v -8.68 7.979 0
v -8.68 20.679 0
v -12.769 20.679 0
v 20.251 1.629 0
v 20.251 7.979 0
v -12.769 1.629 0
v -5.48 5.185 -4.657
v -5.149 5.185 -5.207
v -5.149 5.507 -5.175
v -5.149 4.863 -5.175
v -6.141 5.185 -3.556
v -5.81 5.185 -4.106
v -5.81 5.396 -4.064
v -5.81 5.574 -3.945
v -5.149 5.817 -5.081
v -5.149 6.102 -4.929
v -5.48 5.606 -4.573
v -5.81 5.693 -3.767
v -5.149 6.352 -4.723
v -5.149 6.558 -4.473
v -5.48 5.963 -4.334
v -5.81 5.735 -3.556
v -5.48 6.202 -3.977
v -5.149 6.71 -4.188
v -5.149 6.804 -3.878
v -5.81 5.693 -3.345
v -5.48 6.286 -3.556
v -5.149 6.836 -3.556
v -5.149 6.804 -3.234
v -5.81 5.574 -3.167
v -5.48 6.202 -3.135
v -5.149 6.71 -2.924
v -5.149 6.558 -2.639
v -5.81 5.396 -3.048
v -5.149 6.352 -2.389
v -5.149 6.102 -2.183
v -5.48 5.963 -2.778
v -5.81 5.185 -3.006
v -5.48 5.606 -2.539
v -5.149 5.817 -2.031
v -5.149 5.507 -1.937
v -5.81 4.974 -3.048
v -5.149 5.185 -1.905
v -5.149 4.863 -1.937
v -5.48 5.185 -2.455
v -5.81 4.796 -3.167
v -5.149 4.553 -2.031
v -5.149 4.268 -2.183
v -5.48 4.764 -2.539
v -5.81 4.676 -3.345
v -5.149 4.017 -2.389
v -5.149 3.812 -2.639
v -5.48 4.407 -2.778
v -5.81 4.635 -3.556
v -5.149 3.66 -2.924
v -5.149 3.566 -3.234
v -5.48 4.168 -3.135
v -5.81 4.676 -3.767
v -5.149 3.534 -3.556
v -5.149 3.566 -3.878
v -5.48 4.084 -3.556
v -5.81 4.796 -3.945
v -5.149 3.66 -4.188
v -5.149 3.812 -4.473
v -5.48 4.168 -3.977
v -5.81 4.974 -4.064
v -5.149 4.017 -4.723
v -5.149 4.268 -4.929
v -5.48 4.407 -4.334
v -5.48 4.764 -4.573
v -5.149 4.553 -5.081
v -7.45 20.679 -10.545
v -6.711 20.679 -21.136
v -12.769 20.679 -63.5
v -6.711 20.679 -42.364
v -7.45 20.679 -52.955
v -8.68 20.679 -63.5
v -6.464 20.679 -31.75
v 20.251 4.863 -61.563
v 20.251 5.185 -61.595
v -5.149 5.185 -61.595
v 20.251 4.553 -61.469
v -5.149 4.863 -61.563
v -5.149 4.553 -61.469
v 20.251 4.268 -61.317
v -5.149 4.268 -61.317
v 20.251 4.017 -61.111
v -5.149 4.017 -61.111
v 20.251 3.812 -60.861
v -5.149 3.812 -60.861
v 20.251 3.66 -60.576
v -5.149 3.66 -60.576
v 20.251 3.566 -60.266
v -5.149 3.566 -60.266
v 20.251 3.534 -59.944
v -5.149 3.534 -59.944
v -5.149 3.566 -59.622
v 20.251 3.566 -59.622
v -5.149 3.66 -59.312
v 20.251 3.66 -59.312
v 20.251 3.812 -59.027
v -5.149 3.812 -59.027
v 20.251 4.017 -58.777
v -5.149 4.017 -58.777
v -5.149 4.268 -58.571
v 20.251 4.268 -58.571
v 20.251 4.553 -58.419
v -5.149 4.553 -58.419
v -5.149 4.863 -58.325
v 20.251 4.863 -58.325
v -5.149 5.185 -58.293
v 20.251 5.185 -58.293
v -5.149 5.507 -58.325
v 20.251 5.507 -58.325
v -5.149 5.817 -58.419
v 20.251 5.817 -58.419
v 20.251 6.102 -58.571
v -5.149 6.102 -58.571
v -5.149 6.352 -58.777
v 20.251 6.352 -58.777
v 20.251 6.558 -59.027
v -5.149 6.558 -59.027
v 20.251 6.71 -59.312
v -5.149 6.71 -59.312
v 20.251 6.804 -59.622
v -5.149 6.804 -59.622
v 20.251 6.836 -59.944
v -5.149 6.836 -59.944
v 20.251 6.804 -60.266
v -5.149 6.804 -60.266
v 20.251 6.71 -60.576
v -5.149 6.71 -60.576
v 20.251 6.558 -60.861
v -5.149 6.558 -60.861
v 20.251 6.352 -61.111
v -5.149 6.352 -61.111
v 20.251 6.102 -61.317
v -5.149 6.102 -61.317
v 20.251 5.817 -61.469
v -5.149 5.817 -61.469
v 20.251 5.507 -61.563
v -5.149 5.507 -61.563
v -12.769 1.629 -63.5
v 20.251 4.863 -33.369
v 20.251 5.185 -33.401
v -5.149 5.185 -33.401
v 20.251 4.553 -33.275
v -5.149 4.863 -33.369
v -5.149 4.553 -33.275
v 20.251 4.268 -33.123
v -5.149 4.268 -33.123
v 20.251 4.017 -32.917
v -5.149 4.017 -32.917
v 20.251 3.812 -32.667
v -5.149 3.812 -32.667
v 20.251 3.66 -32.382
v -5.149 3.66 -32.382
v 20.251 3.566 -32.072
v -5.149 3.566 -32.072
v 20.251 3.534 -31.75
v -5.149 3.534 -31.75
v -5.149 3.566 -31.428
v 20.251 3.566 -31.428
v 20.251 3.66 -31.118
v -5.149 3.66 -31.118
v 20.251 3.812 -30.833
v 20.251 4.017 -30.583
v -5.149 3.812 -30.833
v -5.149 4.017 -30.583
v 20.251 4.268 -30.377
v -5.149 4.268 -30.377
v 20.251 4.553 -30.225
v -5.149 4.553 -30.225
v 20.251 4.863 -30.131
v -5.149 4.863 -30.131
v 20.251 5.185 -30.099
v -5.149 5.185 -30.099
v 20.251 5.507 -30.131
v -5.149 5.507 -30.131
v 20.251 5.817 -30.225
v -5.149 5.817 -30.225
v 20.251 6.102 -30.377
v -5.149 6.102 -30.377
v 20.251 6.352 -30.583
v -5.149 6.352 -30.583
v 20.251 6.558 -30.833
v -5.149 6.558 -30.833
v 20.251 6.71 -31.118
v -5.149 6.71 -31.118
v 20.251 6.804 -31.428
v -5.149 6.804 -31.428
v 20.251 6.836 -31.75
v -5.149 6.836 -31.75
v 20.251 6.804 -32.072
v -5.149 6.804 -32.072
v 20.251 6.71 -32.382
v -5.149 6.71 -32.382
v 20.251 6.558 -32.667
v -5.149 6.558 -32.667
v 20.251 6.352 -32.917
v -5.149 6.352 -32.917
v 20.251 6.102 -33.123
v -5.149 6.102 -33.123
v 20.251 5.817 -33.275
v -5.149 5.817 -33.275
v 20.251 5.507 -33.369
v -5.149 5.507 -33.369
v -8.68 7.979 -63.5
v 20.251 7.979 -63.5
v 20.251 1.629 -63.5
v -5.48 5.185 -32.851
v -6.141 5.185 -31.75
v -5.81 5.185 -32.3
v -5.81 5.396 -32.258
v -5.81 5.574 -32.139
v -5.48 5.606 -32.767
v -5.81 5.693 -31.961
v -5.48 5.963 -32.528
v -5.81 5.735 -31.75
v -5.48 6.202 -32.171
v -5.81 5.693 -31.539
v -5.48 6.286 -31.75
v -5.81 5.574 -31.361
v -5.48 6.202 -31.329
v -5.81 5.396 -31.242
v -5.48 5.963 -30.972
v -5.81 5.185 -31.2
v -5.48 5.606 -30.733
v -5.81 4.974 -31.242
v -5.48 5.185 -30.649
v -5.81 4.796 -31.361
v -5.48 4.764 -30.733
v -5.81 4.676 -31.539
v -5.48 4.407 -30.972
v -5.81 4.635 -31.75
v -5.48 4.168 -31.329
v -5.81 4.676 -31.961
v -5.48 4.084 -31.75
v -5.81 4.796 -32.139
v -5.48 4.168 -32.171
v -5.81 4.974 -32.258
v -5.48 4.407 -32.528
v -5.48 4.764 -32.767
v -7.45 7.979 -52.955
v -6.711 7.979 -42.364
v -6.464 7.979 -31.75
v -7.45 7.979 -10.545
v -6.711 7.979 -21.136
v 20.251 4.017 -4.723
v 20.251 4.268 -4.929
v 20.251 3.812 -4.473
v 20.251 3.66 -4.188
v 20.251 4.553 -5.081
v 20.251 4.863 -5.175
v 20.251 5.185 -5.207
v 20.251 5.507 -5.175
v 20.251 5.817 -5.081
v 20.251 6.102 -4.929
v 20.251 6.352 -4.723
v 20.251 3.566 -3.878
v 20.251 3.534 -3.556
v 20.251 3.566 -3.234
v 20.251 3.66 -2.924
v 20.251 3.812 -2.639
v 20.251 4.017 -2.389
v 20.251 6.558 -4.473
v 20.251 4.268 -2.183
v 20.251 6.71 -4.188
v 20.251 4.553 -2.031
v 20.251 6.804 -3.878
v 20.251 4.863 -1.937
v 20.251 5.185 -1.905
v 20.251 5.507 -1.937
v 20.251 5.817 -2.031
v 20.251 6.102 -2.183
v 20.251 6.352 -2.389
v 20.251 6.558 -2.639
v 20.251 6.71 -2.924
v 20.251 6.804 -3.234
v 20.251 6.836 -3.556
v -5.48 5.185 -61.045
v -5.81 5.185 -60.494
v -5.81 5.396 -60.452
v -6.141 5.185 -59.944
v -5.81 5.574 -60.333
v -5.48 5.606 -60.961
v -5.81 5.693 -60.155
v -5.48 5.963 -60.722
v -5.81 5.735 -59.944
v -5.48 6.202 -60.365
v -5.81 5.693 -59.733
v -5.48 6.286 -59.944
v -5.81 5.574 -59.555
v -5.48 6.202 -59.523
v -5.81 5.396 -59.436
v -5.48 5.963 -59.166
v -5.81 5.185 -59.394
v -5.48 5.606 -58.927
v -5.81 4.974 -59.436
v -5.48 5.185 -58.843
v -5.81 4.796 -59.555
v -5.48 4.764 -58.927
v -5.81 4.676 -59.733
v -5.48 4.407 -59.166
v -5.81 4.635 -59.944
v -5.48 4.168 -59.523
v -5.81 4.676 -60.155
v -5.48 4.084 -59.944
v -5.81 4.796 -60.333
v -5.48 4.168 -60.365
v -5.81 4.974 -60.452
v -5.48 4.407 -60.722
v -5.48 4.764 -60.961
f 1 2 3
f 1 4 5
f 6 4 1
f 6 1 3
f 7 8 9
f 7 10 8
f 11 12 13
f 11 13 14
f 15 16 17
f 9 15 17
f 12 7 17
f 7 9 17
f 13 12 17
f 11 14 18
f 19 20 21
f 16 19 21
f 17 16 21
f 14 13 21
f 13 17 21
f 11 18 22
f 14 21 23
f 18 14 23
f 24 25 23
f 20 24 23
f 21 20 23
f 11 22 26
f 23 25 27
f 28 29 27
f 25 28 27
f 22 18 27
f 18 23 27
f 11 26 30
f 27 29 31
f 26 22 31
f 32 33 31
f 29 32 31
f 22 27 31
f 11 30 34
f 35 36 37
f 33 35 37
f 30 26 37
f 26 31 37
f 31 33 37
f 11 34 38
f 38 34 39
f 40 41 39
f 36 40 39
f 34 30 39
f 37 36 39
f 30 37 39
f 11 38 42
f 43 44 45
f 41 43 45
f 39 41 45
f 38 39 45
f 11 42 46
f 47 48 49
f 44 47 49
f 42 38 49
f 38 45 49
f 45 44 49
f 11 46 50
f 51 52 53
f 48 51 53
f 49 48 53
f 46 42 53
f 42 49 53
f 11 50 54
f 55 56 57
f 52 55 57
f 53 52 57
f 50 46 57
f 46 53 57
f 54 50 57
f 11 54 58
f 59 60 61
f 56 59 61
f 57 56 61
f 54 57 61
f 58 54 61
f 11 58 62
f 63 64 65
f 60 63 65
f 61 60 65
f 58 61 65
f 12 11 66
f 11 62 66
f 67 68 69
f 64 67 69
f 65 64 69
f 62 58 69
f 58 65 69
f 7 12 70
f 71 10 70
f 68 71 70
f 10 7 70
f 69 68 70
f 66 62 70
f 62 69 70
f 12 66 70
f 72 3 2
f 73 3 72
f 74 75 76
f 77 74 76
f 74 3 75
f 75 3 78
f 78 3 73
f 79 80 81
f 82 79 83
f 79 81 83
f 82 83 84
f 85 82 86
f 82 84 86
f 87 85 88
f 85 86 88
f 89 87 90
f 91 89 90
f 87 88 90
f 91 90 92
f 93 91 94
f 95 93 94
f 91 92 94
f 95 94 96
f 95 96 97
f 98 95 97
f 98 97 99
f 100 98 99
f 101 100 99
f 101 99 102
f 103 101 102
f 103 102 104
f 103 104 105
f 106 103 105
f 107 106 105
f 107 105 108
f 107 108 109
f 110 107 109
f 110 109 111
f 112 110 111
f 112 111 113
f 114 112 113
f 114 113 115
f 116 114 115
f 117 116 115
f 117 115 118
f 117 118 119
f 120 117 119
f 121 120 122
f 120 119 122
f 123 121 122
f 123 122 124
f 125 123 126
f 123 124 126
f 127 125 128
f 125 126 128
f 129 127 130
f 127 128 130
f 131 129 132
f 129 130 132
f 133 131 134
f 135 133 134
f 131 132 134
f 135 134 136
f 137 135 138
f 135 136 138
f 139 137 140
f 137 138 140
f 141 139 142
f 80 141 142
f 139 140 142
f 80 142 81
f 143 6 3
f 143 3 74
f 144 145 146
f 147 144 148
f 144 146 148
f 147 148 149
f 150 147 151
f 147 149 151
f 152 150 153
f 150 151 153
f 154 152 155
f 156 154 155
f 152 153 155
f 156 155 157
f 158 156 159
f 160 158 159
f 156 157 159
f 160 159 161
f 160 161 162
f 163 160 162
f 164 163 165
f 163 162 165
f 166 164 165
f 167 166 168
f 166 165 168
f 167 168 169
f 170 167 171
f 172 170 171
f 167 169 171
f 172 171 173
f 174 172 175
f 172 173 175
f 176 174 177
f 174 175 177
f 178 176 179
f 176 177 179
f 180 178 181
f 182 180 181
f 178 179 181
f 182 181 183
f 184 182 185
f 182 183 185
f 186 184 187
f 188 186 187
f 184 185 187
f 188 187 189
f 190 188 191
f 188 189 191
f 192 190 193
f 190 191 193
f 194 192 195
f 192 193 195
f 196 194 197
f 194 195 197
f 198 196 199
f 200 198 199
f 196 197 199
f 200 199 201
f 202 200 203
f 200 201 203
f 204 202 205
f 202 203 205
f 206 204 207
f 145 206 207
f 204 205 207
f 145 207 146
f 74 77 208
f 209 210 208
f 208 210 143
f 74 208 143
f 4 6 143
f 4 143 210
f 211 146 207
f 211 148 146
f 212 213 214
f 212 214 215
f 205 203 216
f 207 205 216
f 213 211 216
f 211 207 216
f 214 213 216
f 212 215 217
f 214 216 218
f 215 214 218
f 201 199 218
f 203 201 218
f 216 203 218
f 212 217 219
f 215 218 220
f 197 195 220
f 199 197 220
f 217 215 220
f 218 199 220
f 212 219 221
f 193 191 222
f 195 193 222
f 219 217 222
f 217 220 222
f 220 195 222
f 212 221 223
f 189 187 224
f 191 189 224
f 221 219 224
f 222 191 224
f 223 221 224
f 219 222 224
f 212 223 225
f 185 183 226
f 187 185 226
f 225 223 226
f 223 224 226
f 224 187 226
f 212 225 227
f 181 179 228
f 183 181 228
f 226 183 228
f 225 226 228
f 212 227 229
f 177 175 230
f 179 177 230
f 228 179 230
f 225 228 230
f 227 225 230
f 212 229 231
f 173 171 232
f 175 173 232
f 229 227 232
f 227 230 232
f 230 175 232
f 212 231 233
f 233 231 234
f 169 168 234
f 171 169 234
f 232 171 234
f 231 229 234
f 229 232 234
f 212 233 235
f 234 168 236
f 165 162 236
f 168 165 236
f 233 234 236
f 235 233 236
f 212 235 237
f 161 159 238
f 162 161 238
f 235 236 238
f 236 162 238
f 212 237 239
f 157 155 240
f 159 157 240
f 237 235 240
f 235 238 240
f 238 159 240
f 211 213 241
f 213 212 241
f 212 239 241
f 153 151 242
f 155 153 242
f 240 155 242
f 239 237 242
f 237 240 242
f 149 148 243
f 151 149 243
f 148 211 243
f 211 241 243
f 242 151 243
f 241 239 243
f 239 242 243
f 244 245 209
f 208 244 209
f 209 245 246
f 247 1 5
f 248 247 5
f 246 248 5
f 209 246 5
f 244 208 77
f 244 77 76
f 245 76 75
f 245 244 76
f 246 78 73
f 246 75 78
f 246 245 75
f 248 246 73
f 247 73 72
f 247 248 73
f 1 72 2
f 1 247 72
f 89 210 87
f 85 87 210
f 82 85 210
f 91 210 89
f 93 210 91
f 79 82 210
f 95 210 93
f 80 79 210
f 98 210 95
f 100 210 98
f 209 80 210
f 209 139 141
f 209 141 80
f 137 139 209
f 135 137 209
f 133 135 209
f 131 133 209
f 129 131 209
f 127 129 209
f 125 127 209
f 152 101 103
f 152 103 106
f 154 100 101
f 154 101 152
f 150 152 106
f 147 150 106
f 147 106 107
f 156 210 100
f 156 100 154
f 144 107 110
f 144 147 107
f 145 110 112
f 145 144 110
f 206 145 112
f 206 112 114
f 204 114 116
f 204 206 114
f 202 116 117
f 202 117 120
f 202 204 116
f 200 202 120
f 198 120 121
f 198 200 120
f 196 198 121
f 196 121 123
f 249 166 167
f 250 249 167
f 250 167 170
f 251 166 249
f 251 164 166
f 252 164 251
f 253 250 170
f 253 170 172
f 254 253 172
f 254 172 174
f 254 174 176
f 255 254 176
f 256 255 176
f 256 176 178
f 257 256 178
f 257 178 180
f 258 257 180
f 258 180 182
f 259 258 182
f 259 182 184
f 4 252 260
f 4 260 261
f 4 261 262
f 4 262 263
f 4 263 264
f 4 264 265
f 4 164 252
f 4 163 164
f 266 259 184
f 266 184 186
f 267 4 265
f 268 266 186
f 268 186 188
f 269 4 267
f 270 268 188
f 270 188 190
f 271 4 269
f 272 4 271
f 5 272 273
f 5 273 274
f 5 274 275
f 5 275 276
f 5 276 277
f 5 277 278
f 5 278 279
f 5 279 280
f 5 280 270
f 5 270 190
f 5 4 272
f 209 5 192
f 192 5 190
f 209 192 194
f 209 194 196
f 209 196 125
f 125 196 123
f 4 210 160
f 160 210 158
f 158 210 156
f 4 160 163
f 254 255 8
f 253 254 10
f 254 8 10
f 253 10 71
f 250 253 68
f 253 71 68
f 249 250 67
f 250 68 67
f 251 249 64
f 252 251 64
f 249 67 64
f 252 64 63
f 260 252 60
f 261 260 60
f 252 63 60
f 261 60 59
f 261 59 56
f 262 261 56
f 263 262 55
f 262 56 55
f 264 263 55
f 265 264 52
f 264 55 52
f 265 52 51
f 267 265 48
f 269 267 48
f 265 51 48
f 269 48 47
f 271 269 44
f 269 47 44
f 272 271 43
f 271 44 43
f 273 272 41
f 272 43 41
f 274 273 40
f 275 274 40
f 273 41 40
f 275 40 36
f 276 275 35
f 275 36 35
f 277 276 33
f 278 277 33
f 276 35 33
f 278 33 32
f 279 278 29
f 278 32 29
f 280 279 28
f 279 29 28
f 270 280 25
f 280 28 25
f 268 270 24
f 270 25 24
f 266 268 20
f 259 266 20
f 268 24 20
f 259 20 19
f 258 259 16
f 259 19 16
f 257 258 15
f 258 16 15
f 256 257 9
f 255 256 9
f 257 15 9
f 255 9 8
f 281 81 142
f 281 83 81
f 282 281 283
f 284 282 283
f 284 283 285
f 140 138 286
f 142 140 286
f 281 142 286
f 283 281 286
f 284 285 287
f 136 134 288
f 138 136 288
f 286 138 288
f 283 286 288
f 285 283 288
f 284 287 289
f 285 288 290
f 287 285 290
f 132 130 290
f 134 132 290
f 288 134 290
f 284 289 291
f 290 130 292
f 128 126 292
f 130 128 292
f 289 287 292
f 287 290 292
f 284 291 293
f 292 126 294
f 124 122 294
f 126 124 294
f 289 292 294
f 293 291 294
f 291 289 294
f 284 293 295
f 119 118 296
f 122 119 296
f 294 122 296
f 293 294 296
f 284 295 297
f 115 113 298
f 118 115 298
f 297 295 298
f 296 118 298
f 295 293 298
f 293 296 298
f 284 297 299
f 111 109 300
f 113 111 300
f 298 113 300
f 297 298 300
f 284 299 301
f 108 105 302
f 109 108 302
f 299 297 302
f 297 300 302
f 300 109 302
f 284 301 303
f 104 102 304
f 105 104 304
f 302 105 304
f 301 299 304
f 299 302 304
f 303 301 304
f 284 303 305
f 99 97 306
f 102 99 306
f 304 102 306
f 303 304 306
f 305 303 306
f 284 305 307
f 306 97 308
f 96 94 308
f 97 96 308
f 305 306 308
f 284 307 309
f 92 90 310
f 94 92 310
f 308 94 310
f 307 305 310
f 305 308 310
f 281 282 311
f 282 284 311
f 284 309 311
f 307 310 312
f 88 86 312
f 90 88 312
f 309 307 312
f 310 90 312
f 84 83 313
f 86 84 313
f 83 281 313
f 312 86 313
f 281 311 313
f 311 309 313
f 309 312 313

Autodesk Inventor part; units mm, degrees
ref_plane "YZ Plane" through (0, 0, 0) normal (1, 0, 0) x (0, 1, 0)
ref_plane "XZ Plane" through (0, 0, 0) normal (0, 1, 0) x (-1, 0, 0)
ref_plane "XY Plane" through (0, 0, 0) normal (0, 0, 1) x (1, 0, 0)
sketch "Sketch1" plane through (0, 0, 0) normal (0, 0, 1) x (1, 0, 0)
  line L0 (-12.7691, 1.6289) -> (20.2509, 1.6289)
  line L1 (20.2509, 1.6289) -> (20.2509, 7.9789)
  line L2 (20.2509, 7.9789) -> (-6.4191, 7.9789)
  line L3 (-12.7691, 1.6289) -> (-12.7691, 7.9789)
  line L4 (-12.7691, 7.9789) -> (-6.4191, 7.9789)
  point P0 (0, 0)
  dimension "d1" = 6.35
  dimension "d3" = 26.67
extrude "Extrusion1" add sketch "Sketch1" against normal blind 63.5
sketch "Sketch5" plane through (20.2509, 1.6289, 0) normal (1, 0, 0) x (0, 0, -1)
  line L0 (63.5, 0) -> (63.5, 6.35) projected
  line L1 (0, 0) -> (0, 6.35) projected
  point P0 (0, -1.6289)
  point P1 (3.556, 3.556)
  point P2 (31.75, 3.556)
  point P3 (59.944, 3.556)
  dimension "d34" = 3.556
  dimension "d35" = 3.556
  dimension "d36" = 31.75
  dimension "d37" = 3.556
hole "Hole3" at (20.2509, 5.1849, -3.556) at (20.2509, 5.1849, -31.75) at (20.2509, 5.1849, -59.944) direction (-1, 0, 0) diameter 3.302 depth 25.4 tip angle 118 thread size "8-32 UNC" class "2B" standard "ANSI Unified Screw Threads"
sketch "Sketch8" plane through (-12.7691, 7.9789, 0) normal (0, 1, 0) x (1, 0, 0)
  line L0 (33.02, 63.5) -> (0, 63.5) projected
  line L1 (0, 0) -> (0, 63.5) projected
  line L2 (33.02, 0) -> (0, 0) projected
  arc A0 (4.0894, 0) -> (4.0894, 63.5) centre (-222.295, 31.75) ccw
  point P0 (12.7691, 0)
  dimension "d48" = 4.0894
  dimension "d49" = 4.0894
  dimension "d50" = 228.6
extrude "Extrusion3" add sketch "Sketch8" along normal blind 12.7
properties part number "JF-AT-JC0016" material "Aluminum-6061"
